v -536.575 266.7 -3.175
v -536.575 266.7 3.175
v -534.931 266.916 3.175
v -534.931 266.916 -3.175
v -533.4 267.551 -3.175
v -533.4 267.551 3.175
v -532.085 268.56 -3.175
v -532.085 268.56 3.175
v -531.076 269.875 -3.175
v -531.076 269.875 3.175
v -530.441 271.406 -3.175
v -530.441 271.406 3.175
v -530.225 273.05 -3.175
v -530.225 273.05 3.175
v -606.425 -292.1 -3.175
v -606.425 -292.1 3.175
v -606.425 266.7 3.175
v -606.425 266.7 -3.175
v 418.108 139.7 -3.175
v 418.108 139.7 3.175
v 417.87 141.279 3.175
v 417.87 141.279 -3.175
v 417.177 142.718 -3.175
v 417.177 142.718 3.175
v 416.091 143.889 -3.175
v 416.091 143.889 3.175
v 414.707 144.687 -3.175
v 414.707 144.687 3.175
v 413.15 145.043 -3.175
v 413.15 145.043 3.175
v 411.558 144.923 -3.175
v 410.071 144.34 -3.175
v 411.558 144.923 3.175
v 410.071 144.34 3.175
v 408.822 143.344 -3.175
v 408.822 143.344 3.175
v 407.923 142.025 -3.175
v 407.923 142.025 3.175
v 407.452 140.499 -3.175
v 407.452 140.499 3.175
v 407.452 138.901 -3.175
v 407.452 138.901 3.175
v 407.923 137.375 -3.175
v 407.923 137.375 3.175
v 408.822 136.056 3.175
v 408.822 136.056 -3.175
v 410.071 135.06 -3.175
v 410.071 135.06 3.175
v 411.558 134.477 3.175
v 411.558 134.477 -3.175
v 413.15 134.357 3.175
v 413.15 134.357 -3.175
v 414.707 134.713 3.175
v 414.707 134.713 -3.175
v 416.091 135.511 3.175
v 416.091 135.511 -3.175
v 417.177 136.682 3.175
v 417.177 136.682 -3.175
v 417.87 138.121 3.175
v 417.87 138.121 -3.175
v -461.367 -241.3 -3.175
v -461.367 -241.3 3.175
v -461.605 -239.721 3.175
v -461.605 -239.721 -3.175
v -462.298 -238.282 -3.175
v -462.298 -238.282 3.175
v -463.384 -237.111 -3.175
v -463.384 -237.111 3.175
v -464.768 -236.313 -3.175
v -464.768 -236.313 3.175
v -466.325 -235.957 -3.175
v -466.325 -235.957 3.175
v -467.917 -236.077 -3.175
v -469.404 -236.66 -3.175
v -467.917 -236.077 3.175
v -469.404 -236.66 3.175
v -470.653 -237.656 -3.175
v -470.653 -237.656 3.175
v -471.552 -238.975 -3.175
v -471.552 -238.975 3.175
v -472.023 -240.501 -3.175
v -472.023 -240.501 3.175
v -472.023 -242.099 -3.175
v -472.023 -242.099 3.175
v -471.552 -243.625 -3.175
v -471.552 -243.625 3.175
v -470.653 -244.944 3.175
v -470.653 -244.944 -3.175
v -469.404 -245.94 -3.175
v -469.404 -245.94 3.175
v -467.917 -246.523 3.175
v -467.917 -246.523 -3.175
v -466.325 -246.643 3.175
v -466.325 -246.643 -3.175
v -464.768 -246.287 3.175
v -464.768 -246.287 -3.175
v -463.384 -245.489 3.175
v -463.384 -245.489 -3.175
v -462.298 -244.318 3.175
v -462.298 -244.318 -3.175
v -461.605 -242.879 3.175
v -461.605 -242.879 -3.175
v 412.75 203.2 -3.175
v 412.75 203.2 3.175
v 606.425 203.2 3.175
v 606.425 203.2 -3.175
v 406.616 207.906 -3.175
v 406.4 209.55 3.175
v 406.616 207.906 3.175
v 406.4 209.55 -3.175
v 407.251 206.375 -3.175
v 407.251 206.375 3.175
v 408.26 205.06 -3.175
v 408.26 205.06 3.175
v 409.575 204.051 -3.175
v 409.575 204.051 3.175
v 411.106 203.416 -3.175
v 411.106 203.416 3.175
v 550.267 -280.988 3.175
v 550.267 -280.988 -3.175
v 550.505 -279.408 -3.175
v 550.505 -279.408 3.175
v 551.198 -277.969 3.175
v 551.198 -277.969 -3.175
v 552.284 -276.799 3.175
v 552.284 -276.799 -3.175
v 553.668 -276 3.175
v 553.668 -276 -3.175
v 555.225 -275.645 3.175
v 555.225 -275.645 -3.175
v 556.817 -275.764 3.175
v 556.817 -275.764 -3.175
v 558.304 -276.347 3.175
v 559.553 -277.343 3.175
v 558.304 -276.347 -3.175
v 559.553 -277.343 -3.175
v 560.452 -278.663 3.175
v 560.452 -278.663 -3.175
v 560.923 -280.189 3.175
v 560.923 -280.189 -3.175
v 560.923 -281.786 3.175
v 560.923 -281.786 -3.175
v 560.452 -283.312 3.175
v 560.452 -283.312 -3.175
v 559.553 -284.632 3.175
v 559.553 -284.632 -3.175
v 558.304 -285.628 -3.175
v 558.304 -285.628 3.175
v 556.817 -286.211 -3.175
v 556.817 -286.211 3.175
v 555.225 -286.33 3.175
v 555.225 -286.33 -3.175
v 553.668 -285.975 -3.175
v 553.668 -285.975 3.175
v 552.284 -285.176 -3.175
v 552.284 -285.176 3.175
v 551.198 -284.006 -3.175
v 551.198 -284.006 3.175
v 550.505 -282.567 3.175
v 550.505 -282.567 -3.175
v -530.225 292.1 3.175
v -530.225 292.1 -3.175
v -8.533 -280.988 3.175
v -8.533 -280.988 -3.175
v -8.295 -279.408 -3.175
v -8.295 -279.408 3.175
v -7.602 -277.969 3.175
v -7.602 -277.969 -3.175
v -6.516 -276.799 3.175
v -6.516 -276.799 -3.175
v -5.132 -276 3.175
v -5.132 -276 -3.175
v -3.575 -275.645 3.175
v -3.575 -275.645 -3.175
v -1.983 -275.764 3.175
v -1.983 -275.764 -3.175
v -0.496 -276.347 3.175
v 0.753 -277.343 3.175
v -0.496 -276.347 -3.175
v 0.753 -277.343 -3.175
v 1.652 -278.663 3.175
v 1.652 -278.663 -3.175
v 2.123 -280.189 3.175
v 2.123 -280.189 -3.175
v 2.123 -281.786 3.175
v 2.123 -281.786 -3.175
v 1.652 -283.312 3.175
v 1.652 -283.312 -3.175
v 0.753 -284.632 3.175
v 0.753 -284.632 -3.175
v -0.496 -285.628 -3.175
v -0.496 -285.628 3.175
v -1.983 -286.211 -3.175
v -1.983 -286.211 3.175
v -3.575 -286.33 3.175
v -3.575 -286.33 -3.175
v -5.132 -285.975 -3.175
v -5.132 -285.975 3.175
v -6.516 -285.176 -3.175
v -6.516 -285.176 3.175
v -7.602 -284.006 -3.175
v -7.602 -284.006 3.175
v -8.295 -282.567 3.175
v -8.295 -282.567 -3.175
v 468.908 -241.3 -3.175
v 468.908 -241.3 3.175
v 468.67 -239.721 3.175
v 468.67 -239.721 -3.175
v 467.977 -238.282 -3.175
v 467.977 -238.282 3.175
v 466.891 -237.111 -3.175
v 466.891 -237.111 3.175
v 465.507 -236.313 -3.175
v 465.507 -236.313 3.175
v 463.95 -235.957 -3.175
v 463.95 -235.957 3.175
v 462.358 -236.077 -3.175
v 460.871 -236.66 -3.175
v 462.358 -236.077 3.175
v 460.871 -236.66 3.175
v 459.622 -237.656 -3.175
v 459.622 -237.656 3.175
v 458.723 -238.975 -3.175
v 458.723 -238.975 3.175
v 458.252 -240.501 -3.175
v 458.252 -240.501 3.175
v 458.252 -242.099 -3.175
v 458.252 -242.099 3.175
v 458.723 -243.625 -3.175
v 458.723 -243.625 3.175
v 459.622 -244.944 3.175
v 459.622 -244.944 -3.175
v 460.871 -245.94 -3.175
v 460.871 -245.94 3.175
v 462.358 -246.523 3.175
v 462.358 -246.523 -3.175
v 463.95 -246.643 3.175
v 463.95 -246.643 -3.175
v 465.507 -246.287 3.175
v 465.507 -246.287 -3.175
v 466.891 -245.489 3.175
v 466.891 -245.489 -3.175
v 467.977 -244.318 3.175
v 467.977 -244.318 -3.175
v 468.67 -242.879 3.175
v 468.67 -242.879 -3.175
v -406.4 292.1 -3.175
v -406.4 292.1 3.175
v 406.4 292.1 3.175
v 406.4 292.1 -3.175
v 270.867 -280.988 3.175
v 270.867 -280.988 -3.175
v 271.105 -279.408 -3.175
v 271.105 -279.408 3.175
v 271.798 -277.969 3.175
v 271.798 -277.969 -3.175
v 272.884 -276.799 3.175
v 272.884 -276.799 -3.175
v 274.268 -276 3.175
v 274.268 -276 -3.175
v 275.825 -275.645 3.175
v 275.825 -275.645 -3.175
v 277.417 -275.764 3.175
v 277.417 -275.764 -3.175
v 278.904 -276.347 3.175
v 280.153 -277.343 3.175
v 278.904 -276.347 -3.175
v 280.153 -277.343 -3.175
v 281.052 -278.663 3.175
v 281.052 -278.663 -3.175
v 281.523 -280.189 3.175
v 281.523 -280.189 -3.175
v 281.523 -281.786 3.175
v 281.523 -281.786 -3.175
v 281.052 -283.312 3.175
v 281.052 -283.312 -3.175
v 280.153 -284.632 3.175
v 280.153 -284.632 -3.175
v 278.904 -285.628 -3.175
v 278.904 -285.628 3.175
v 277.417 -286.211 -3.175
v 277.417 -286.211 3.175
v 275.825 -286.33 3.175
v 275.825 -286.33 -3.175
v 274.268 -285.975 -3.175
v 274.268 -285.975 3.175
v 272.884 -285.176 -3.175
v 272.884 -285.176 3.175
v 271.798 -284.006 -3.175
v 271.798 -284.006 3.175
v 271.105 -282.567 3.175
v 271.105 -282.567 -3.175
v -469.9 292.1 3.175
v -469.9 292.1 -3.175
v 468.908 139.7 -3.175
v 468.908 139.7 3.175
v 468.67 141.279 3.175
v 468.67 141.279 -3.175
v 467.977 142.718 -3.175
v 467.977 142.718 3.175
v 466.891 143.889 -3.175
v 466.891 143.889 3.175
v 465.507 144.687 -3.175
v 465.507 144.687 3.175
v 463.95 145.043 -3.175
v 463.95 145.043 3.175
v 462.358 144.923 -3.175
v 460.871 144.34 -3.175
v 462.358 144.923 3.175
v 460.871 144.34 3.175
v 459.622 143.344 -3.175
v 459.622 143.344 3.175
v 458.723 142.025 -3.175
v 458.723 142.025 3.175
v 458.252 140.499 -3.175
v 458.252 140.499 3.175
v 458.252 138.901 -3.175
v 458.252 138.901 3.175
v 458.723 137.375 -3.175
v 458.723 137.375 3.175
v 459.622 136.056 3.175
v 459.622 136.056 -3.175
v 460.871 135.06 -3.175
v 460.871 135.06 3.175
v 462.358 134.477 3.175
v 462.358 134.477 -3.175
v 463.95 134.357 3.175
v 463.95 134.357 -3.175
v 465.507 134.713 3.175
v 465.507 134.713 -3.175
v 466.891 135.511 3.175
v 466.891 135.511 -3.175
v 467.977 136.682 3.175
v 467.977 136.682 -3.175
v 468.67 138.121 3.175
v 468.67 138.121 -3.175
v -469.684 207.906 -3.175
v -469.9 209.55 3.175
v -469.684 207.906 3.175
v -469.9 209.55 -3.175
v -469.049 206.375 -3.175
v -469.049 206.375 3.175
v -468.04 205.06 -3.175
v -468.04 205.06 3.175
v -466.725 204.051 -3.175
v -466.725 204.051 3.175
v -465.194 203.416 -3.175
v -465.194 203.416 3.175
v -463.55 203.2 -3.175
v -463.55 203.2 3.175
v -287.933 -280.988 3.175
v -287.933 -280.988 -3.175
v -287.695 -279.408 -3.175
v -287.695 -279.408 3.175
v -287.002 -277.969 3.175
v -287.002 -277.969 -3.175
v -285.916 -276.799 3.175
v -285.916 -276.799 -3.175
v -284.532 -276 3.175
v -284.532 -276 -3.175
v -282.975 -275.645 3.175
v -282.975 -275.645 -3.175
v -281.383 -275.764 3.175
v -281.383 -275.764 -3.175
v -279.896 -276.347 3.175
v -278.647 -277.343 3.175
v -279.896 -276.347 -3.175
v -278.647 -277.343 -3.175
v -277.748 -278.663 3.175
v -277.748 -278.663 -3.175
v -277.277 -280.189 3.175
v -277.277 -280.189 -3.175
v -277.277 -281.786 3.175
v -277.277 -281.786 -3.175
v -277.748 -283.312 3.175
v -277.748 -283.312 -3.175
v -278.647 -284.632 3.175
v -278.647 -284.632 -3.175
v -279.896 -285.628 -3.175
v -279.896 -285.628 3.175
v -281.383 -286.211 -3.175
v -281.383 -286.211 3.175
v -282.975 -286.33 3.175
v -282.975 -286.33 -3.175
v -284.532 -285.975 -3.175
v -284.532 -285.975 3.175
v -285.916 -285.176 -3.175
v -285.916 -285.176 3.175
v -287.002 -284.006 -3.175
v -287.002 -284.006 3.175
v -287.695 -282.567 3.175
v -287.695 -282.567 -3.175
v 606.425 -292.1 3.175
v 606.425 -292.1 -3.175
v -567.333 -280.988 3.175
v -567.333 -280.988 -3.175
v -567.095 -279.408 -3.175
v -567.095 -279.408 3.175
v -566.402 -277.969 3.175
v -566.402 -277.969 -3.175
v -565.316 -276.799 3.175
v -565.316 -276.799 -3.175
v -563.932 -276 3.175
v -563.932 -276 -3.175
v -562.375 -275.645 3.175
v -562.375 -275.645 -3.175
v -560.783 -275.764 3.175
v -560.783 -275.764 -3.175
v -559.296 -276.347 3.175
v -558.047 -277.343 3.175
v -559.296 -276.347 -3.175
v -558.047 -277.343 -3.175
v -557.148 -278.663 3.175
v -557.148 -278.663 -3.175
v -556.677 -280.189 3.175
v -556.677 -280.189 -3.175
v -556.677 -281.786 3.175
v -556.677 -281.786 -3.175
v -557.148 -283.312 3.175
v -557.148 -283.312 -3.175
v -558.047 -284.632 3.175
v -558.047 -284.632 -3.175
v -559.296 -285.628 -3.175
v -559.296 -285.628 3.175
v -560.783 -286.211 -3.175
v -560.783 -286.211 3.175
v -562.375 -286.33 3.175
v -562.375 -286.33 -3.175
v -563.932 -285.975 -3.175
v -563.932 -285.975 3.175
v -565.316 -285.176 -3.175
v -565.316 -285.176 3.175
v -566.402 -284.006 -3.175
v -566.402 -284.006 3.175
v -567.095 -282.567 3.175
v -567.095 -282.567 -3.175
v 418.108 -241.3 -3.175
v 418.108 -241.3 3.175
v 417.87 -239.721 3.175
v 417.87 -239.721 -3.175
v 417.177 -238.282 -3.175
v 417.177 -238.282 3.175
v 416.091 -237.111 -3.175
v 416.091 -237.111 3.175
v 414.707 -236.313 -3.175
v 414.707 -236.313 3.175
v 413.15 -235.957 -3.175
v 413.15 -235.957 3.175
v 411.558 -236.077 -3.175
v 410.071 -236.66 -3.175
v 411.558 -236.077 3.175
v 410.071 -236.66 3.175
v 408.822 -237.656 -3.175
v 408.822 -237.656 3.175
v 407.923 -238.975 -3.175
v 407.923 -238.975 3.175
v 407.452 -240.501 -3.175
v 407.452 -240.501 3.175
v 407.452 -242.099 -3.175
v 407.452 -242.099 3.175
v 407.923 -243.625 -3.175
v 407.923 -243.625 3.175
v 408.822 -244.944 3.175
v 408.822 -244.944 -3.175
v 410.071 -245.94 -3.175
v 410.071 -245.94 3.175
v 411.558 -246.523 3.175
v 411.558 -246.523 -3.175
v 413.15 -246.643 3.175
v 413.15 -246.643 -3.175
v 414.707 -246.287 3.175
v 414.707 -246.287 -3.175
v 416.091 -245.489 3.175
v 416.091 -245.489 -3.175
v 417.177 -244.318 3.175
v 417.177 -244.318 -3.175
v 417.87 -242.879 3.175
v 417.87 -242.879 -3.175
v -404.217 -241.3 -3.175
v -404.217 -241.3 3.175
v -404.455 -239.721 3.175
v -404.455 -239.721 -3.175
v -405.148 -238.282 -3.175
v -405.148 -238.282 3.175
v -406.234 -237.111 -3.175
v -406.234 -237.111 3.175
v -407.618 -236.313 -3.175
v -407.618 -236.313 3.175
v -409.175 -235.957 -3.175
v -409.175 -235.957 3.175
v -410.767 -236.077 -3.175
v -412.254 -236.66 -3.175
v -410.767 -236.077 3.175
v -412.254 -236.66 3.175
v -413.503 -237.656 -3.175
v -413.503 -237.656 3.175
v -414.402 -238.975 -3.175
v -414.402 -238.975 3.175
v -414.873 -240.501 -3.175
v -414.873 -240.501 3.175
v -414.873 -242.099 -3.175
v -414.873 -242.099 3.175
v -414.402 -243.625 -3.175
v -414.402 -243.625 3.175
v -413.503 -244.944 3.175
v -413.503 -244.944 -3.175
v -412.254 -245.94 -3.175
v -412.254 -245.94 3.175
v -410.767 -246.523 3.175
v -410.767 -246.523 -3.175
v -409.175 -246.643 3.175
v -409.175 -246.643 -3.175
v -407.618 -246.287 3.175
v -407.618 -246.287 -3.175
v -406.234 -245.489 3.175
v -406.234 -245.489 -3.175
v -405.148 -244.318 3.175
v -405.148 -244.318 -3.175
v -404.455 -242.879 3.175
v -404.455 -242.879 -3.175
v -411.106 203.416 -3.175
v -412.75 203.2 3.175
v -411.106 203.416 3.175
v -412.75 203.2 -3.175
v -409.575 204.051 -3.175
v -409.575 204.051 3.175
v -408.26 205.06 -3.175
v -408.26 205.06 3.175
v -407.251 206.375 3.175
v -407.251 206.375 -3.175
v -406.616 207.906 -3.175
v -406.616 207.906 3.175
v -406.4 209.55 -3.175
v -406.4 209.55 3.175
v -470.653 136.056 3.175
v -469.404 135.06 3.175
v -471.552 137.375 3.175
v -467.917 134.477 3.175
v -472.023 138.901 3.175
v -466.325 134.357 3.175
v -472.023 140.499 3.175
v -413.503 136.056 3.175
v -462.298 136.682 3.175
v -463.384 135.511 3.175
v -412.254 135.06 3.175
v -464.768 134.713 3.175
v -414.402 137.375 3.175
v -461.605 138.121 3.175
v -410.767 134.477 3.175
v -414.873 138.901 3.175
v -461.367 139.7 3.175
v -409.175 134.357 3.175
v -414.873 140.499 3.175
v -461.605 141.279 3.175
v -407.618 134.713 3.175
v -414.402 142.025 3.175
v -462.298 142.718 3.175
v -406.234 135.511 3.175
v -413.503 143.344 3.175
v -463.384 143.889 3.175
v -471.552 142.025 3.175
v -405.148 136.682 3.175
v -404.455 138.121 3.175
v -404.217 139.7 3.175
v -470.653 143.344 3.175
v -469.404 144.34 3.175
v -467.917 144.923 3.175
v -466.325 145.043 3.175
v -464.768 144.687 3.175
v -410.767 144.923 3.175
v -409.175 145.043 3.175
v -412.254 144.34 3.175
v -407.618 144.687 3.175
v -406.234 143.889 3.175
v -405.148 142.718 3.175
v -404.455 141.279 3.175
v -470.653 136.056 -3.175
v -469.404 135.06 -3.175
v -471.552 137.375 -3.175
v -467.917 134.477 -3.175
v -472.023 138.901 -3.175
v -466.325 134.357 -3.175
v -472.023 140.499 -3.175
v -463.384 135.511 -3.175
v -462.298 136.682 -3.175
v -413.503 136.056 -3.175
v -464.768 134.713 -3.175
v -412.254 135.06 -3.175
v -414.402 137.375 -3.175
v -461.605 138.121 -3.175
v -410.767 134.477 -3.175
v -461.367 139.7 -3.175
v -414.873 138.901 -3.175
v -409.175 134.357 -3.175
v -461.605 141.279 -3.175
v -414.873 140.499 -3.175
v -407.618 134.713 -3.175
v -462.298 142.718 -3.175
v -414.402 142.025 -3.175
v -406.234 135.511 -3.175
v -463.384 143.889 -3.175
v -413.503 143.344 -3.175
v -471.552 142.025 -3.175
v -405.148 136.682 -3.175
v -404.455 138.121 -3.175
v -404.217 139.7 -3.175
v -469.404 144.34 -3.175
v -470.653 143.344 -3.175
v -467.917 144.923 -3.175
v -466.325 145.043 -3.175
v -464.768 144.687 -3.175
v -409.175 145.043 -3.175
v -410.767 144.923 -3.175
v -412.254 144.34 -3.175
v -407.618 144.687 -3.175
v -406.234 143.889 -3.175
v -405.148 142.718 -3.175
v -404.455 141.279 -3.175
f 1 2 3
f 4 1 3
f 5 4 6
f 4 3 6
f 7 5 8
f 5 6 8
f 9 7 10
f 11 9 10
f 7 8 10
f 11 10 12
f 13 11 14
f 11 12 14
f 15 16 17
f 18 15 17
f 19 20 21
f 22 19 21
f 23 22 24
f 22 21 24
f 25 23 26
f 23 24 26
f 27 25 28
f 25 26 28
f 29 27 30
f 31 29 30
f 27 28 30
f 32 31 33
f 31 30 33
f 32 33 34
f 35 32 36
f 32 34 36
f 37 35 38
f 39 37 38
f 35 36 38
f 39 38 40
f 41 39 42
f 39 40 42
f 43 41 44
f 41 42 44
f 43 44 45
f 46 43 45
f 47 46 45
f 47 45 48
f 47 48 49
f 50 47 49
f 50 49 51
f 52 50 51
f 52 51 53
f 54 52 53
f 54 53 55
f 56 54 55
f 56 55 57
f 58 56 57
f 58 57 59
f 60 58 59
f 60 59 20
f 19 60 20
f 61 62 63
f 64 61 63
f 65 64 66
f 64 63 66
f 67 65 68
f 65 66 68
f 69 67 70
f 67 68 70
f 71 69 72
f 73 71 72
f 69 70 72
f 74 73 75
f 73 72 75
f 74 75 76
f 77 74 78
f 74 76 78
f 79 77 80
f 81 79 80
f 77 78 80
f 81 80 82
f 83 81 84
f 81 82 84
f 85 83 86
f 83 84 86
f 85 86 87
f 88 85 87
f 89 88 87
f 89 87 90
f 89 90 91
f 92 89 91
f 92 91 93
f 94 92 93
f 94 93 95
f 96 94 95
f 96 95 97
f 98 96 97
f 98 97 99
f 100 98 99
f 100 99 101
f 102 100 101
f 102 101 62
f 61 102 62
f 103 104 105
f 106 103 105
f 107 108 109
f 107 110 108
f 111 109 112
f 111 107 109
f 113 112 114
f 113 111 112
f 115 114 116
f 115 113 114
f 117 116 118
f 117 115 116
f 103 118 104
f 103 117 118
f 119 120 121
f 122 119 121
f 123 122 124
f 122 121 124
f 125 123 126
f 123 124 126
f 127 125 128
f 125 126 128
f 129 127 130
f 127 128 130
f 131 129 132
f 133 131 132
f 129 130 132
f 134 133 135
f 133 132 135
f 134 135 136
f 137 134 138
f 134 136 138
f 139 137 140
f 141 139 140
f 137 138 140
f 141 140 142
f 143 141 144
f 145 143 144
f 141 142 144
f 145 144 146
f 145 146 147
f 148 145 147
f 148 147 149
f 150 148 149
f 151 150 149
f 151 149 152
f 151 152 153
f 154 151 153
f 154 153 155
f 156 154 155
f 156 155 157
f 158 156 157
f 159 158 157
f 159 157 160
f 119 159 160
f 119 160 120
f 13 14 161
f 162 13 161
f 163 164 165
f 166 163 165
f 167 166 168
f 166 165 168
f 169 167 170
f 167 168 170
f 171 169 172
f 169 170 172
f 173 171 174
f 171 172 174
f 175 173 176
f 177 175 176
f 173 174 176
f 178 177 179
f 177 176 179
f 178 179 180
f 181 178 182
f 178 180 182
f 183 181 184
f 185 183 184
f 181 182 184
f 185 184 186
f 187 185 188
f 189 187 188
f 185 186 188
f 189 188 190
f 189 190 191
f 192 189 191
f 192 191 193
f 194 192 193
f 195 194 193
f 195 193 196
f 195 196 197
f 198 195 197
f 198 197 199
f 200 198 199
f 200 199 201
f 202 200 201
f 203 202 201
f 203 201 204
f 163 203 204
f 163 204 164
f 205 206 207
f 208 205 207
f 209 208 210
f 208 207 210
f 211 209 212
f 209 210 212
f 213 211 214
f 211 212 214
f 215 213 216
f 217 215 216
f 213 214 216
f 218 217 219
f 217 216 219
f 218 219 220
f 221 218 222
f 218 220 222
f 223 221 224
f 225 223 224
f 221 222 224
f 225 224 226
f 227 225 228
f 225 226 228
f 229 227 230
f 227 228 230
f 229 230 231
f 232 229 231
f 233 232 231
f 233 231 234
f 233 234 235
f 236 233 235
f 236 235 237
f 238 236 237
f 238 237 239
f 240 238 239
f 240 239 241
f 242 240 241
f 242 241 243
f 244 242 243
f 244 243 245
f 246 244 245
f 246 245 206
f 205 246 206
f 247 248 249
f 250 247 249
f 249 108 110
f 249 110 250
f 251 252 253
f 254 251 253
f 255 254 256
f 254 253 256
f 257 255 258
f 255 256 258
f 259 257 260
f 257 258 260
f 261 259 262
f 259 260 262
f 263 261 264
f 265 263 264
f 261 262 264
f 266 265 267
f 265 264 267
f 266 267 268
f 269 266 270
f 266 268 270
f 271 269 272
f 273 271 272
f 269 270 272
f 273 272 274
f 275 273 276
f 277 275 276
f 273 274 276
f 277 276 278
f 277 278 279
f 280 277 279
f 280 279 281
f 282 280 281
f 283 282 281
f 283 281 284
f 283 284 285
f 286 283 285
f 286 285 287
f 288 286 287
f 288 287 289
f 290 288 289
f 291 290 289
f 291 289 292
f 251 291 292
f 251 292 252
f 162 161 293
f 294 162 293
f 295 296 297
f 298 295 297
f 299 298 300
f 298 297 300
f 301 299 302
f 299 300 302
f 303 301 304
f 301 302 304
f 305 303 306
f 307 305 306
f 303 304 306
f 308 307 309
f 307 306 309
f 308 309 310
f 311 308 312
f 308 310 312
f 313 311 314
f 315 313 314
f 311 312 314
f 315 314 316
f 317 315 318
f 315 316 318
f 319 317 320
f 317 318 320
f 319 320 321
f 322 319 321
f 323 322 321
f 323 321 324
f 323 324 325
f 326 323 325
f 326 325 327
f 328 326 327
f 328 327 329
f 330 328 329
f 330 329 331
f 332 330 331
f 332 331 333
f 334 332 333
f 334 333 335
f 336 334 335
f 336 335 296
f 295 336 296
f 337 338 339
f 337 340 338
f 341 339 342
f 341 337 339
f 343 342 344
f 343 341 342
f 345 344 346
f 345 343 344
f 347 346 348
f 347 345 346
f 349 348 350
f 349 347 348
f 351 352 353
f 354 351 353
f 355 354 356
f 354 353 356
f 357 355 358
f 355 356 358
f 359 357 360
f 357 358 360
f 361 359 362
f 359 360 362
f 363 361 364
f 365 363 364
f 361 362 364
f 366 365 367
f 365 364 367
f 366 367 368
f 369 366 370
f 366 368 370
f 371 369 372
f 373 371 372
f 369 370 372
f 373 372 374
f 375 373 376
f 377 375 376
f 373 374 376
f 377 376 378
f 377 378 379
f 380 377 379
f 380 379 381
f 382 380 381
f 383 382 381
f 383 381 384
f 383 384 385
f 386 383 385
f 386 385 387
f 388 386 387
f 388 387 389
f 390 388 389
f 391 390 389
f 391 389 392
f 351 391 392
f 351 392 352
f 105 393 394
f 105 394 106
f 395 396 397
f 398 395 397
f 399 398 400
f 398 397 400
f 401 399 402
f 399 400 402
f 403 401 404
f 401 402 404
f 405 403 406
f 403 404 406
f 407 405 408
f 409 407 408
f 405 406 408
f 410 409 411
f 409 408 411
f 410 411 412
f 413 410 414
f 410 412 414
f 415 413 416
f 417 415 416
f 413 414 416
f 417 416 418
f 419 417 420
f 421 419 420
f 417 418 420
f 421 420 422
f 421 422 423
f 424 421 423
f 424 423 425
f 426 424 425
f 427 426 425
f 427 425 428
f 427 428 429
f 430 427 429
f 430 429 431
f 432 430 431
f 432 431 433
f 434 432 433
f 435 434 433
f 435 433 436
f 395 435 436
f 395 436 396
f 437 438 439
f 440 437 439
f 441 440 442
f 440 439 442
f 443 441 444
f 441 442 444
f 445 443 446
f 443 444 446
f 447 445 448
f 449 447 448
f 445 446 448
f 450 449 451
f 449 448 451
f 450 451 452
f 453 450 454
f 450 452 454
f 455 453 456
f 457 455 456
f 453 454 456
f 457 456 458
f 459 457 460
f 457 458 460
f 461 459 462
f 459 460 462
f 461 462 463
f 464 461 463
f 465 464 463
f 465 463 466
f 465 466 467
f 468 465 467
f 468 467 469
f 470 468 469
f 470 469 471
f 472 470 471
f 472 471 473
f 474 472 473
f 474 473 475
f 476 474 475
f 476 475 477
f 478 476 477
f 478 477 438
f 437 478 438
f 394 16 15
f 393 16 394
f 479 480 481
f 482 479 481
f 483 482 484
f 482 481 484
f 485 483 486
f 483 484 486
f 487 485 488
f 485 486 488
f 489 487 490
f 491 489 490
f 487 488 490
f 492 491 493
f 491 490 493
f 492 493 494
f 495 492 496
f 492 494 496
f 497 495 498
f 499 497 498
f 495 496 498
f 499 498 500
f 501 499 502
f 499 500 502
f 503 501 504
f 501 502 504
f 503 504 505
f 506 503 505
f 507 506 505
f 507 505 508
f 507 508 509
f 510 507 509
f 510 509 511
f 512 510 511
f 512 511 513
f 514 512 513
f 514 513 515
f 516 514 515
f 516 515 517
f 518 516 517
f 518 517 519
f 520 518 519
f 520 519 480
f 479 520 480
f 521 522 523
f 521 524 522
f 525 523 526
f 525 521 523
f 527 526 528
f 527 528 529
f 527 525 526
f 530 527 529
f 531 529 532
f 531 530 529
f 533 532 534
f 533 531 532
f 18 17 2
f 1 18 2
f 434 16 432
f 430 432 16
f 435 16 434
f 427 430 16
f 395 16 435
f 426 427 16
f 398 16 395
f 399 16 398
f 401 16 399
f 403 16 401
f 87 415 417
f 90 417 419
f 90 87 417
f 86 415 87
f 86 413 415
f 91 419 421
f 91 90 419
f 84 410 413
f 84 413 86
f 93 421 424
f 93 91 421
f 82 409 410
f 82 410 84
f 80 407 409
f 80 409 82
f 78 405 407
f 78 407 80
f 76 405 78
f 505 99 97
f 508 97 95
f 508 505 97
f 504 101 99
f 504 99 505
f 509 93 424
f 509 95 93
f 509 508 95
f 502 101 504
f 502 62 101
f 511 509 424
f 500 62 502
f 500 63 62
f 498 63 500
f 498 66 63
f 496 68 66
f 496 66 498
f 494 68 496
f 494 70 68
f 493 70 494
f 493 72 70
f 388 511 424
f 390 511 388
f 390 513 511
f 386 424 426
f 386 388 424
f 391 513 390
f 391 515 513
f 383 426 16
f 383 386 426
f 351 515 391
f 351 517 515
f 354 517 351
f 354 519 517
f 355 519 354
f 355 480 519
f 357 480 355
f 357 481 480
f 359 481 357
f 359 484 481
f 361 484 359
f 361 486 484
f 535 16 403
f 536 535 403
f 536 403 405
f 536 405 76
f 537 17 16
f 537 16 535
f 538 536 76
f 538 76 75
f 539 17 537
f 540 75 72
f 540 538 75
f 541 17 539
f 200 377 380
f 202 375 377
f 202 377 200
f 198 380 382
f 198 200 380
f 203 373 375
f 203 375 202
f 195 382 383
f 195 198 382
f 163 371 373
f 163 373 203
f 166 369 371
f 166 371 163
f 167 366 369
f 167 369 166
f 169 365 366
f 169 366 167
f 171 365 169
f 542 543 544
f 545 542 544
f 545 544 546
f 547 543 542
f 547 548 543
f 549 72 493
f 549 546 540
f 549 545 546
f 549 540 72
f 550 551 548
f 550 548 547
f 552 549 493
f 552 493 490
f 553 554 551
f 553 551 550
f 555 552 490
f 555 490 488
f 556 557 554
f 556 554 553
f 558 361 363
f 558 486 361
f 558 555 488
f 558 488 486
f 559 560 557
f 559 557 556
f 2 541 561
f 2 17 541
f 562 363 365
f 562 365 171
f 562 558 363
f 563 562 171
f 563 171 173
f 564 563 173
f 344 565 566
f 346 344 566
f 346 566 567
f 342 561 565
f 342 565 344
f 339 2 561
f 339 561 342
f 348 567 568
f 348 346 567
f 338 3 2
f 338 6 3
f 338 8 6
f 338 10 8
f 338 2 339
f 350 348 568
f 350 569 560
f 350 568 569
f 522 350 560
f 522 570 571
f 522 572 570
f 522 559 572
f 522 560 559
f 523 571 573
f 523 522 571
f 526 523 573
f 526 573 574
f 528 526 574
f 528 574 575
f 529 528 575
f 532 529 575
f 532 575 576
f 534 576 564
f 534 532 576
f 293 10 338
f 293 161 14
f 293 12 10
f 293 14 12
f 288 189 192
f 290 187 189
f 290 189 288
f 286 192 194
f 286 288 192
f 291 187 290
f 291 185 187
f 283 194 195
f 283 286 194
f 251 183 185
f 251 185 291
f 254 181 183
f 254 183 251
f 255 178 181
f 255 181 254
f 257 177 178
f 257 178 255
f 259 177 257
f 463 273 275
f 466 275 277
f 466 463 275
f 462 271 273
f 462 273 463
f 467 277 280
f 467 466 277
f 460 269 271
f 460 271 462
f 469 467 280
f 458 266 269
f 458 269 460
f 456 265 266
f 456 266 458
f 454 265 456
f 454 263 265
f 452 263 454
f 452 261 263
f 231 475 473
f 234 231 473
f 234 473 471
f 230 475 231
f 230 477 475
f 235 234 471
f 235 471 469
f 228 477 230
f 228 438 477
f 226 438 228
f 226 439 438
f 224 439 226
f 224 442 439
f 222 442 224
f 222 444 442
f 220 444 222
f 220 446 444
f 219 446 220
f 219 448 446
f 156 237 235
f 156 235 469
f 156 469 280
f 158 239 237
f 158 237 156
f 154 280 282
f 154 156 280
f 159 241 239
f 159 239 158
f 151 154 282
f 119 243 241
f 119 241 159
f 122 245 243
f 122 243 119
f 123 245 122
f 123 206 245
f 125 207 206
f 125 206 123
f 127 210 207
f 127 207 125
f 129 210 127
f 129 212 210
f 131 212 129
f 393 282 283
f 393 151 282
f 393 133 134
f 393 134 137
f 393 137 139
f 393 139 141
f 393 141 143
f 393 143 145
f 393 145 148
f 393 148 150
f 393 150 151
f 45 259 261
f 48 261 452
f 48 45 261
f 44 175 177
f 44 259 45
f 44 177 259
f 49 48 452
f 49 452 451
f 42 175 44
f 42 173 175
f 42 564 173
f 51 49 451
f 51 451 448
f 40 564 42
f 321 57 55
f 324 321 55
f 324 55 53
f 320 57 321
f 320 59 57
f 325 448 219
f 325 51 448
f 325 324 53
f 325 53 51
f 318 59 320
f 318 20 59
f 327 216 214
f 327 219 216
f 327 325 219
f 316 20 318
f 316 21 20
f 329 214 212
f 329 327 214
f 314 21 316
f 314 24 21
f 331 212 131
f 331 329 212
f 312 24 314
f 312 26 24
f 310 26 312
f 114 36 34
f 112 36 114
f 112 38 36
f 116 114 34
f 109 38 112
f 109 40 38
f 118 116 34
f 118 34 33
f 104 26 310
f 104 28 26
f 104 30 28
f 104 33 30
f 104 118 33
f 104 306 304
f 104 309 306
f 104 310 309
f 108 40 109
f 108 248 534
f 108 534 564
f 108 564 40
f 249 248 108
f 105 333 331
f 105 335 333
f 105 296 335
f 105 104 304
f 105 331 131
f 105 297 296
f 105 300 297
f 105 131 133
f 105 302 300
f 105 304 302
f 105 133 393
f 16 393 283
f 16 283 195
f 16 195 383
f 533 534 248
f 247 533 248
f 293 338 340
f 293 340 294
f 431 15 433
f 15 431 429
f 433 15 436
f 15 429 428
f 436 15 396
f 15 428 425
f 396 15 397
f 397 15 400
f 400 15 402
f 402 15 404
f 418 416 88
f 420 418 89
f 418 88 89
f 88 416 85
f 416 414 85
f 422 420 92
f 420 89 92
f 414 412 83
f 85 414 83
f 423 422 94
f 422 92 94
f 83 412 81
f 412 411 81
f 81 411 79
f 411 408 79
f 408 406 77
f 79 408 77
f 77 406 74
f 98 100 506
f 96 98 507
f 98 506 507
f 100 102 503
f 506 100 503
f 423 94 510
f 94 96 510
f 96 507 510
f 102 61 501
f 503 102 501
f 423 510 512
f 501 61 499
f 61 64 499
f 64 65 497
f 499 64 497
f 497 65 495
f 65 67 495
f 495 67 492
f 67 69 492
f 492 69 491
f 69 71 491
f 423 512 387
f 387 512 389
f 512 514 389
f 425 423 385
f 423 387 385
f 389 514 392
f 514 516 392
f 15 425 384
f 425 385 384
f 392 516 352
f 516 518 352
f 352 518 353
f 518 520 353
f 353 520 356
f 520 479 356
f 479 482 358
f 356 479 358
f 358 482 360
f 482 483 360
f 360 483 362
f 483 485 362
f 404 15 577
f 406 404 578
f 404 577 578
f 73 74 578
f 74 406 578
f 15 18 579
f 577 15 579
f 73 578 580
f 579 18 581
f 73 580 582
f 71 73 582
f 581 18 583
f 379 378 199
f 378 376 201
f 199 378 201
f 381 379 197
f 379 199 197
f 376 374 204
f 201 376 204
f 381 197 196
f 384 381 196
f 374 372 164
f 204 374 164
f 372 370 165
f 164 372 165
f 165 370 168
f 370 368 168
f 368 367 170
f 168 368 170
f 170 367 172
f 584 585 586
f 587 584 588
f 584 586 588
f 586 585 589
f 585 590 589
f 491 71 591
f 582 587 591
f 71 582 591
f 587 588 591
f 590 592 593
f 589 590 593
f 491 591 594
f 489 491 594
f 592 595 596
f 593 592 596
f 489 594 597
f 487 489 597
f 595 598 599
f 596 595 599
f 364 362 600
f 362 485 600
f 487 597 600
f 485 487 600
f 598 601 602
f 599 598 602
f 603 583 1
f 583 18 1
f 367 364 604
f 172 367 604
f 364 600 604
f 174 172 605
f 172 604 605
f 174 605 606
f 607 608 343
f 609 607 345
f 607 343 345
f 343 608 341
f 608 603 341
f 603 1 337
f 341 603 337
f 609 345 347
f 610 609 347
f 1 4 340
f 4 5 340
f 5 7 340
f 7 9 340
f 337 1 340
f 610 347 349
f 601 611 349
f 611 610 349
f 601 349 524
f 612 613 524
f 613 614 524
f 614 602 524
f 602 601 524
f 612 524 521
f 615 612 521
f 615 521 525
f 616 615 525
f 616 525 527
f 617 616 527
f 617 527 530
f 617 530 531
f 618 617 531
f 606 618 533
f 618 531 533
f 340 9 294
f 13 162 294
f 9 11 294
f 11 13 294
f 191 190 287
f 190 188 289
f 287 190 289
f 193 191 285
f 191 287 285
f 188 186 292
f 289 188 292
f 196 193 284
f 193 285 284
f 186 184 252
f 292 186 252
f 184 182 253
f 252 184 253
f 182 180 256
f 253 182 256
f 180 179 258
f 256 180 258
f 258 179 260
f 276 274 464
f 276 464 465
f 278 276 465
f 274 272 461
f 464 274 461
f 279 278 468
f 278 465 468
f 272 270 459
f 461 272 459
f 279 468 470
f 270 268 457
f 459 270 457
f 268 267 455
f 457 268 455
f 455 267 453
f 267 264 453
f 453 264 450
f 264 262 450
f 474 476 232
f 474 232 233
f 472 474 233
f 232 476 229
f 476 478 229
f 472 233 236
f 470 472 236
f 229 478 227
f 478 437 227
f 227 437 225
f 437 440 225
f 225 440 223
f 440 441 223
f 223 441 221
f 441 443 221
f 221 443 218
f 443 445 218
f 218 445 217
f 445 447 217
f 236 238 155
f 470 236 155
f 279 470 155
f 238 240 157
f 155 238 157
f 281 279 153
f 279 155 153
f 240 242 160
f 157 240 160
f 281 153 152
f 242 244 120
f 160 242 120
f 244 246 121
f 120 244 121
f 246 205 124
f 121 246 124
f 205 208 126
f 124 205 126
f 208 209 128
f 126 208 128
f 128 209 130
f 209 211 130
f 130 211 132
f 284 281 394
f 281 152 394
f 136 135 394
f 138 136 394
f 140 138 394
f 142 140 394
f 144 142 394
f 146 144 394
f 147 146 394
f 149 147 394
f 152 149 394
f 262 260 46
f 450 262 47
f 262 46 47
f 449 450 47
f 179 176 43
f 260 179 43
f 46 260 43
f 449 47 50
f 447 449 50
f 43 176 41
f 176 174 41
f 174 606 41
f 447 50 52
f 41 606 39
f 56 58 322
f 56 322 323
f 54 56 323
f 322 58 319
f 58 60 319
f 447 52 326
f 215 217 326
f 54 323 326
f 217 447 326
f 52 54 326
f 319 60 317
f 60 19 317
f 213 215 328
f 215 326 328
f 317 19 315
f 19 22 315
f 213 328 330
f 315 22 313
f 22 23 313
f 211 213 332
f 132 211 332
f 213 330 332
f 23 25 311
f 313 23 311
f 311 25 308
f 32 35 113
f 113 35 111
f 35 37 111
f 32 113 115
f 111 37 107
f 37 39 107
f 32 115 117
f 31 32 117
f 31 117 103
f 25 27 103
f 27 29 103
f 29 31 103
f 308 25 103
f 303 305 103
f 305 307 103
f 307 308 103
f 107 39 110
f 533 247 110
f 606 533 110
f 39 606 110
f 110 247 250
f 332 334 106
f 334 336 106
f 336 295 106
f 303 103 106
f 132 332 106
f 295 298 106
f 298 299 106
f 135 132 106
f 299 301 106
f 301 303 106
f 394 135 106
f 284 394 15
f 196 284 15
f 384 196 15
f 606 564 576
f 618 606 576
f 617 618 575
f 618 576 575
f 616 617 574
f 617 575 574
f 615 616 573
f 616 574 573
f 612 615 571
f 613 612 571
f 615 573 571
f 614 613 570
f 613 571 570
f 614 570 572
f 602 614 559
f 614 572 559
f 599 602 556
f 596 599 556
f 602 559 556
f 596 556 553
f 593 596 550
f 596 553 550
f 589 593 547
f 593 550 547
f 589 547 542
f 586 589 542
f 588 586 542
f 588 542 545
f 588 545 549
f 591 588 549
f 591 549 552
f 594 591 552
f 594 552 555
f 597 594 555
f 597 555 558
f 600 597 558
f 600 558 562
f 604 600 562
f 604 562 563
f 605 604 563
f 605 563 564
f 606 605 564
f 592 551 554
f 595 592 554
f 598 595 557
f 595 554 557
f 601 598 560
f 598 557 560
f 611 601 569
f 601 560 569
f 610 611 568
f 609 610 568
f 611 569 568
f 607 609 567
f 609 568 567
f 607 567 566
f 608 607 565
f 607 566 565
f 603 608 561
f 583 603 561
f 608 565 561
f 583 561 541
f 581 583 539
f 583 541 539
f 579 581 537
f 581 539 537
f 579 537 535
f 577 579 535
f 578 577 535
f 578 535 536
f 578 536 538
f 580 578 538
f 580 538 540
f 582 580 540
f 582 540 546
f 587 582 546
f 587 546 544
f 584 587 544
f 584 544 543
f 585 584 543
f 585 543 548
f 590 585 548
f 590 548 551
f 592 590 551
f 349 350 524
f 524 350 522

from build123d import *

# Parameters (mm, degrees)
SKETCH1_W                        = 1212.85
SKETCH1_H                        = 584.2
BOSS_EXTRUDE1_DEPTH              = 3.175
SKETCH2_R                        = 5.3578125
SKETCH2_W                        = 63.5
SKETCH2_H                        = 88.9
CUT_EXTRUDE1_DEPTH               = 674.137439996
FILLET1_R                        = 6.35
SKETCH3_W                        = 142.875
SKETCH3_H                        = 88.9
CUT_EXTRUDE2_DEPTH               = 674.137439996
F_27_64_0_42188_DIAMETER_HOLE1_D = 10.715752
LPATTERN1_COUNT                  = 5
LPATTERN1_PITCH                  = 279.4
CUT_EXTRUDE3_DEPTH               = 674.137439996


with BuildPart() as part:
    # Sketch1 → Boss-Extrude1 (new, symmetric)
    with BuildSketch(Plane.XY):
        Rectangle(SKETCH1_W, SKETCH1_H)
    extrude(amount=BOSS_EXTRUDE1_DEPTH, both=True)

    # Sketch2 → Cut-Extrude1 (cut, through all)
    with BuildSketch(Plane.XY.offset(3.175)):
        with Locations((-466.725, 139.7)):
            Circle(SKETCH2_R)
        with Locations((-409.575, 139.7)):
            Circle(SKETCH2_R)
        with Locations((-466.725, -241.3)):
            Circle(SKETCH2_R)
        with Locations((-409.575, -241.3)):
            Circle(SKETCH2_R)
        with Locations((412.75, 139.7)):
            Circle(SKETCH2_R)
        with Locations((463.55, 139.7)):
            Circle(SKETCH2_R)
        with Locations((412.75, -241.3)):
            Circle(SKETCH2_R)
        with Locations((463.55, -241.3)):
            Circle(SKETCH2_R)
        with Locations((438.15, 247.65)):
            Rectangle(SKETCH2_W, SKETCH2_H)
        with Locations((-438.15, 247.65)):
            Rectangle(SKETCH2_W, SKETCH2_H)
    extrude(amount=-CUT_EXTRUDE1_DEPTH, mode=Mode.SUBTRACT)

    # Fillet1
    fillet1_edges = [part.edges().sort_by_distance(p)[0] for p in [
        (-406.4, 203.2, 0),
        (-469.9, 203.2, 0),
        (469.9, 203.2, 0),
        (406.4, 203.2, 0),
    ]]
    fillet(fillet1_edges, radius=FILLET1_R)

    # Sketch3 → Cut-Extrude2 (cut, through all)
    with BuildSketch(Plane.XY.offset(3.175)):
        with Locations((534.9875, 247.65)):
            Rectangle(SKETCH3_W, SKETCH3_H)
    extrude(amount=-CUT_EXTRUDE2_DEPTH, mode=Mode.SUBTRACT)

    # 27/64 (0.42188) Diameter Hole1 (through all)
    with Locations(Plane.XY.offset(3.175)):
        with Locations((-561.975, -280.9875)):
            f_27_64_0_42188_diameter_hole1 = Hole(F_27_64_0_42188_DIAMETER_HOLE1_D / 2)

    # LPattern1: 27/64 (0.42188) Diameter Hole1 ×5
    with Locations(*[(i * LPATTERN1_PITCH, 0, 0) for i in range(1, LPATTERN1_COUNT)]):
        add(f_27_64_0_42188_diameter_hole1, mode=Mode.SUBTRACT)

    # Sketch6 → Cut-Extrude3 (cut, through all)
    with BuildSketch(Plane.XY.offset(3.175)):
        with BuildLine():
            Line((-606.425, 292.1), (-606.425, 266.7))
            Line((-606.425, 266.7), (-536.575, 266.7))
            ThreePointArc((-536.575, 266.7), (-532.084871939, 268.559871939), (-530.225, 273.05))
            Line((-530.225, 273.05), (-530.225, 292.1))
            Line((-530.225, 292.1), (-606.425, 292.1))
        make_face()
    extrude(amount=-CUT_EXTRUDE3_DEPTH, mode=Mode.SUBTRACT)


solid = part.part
